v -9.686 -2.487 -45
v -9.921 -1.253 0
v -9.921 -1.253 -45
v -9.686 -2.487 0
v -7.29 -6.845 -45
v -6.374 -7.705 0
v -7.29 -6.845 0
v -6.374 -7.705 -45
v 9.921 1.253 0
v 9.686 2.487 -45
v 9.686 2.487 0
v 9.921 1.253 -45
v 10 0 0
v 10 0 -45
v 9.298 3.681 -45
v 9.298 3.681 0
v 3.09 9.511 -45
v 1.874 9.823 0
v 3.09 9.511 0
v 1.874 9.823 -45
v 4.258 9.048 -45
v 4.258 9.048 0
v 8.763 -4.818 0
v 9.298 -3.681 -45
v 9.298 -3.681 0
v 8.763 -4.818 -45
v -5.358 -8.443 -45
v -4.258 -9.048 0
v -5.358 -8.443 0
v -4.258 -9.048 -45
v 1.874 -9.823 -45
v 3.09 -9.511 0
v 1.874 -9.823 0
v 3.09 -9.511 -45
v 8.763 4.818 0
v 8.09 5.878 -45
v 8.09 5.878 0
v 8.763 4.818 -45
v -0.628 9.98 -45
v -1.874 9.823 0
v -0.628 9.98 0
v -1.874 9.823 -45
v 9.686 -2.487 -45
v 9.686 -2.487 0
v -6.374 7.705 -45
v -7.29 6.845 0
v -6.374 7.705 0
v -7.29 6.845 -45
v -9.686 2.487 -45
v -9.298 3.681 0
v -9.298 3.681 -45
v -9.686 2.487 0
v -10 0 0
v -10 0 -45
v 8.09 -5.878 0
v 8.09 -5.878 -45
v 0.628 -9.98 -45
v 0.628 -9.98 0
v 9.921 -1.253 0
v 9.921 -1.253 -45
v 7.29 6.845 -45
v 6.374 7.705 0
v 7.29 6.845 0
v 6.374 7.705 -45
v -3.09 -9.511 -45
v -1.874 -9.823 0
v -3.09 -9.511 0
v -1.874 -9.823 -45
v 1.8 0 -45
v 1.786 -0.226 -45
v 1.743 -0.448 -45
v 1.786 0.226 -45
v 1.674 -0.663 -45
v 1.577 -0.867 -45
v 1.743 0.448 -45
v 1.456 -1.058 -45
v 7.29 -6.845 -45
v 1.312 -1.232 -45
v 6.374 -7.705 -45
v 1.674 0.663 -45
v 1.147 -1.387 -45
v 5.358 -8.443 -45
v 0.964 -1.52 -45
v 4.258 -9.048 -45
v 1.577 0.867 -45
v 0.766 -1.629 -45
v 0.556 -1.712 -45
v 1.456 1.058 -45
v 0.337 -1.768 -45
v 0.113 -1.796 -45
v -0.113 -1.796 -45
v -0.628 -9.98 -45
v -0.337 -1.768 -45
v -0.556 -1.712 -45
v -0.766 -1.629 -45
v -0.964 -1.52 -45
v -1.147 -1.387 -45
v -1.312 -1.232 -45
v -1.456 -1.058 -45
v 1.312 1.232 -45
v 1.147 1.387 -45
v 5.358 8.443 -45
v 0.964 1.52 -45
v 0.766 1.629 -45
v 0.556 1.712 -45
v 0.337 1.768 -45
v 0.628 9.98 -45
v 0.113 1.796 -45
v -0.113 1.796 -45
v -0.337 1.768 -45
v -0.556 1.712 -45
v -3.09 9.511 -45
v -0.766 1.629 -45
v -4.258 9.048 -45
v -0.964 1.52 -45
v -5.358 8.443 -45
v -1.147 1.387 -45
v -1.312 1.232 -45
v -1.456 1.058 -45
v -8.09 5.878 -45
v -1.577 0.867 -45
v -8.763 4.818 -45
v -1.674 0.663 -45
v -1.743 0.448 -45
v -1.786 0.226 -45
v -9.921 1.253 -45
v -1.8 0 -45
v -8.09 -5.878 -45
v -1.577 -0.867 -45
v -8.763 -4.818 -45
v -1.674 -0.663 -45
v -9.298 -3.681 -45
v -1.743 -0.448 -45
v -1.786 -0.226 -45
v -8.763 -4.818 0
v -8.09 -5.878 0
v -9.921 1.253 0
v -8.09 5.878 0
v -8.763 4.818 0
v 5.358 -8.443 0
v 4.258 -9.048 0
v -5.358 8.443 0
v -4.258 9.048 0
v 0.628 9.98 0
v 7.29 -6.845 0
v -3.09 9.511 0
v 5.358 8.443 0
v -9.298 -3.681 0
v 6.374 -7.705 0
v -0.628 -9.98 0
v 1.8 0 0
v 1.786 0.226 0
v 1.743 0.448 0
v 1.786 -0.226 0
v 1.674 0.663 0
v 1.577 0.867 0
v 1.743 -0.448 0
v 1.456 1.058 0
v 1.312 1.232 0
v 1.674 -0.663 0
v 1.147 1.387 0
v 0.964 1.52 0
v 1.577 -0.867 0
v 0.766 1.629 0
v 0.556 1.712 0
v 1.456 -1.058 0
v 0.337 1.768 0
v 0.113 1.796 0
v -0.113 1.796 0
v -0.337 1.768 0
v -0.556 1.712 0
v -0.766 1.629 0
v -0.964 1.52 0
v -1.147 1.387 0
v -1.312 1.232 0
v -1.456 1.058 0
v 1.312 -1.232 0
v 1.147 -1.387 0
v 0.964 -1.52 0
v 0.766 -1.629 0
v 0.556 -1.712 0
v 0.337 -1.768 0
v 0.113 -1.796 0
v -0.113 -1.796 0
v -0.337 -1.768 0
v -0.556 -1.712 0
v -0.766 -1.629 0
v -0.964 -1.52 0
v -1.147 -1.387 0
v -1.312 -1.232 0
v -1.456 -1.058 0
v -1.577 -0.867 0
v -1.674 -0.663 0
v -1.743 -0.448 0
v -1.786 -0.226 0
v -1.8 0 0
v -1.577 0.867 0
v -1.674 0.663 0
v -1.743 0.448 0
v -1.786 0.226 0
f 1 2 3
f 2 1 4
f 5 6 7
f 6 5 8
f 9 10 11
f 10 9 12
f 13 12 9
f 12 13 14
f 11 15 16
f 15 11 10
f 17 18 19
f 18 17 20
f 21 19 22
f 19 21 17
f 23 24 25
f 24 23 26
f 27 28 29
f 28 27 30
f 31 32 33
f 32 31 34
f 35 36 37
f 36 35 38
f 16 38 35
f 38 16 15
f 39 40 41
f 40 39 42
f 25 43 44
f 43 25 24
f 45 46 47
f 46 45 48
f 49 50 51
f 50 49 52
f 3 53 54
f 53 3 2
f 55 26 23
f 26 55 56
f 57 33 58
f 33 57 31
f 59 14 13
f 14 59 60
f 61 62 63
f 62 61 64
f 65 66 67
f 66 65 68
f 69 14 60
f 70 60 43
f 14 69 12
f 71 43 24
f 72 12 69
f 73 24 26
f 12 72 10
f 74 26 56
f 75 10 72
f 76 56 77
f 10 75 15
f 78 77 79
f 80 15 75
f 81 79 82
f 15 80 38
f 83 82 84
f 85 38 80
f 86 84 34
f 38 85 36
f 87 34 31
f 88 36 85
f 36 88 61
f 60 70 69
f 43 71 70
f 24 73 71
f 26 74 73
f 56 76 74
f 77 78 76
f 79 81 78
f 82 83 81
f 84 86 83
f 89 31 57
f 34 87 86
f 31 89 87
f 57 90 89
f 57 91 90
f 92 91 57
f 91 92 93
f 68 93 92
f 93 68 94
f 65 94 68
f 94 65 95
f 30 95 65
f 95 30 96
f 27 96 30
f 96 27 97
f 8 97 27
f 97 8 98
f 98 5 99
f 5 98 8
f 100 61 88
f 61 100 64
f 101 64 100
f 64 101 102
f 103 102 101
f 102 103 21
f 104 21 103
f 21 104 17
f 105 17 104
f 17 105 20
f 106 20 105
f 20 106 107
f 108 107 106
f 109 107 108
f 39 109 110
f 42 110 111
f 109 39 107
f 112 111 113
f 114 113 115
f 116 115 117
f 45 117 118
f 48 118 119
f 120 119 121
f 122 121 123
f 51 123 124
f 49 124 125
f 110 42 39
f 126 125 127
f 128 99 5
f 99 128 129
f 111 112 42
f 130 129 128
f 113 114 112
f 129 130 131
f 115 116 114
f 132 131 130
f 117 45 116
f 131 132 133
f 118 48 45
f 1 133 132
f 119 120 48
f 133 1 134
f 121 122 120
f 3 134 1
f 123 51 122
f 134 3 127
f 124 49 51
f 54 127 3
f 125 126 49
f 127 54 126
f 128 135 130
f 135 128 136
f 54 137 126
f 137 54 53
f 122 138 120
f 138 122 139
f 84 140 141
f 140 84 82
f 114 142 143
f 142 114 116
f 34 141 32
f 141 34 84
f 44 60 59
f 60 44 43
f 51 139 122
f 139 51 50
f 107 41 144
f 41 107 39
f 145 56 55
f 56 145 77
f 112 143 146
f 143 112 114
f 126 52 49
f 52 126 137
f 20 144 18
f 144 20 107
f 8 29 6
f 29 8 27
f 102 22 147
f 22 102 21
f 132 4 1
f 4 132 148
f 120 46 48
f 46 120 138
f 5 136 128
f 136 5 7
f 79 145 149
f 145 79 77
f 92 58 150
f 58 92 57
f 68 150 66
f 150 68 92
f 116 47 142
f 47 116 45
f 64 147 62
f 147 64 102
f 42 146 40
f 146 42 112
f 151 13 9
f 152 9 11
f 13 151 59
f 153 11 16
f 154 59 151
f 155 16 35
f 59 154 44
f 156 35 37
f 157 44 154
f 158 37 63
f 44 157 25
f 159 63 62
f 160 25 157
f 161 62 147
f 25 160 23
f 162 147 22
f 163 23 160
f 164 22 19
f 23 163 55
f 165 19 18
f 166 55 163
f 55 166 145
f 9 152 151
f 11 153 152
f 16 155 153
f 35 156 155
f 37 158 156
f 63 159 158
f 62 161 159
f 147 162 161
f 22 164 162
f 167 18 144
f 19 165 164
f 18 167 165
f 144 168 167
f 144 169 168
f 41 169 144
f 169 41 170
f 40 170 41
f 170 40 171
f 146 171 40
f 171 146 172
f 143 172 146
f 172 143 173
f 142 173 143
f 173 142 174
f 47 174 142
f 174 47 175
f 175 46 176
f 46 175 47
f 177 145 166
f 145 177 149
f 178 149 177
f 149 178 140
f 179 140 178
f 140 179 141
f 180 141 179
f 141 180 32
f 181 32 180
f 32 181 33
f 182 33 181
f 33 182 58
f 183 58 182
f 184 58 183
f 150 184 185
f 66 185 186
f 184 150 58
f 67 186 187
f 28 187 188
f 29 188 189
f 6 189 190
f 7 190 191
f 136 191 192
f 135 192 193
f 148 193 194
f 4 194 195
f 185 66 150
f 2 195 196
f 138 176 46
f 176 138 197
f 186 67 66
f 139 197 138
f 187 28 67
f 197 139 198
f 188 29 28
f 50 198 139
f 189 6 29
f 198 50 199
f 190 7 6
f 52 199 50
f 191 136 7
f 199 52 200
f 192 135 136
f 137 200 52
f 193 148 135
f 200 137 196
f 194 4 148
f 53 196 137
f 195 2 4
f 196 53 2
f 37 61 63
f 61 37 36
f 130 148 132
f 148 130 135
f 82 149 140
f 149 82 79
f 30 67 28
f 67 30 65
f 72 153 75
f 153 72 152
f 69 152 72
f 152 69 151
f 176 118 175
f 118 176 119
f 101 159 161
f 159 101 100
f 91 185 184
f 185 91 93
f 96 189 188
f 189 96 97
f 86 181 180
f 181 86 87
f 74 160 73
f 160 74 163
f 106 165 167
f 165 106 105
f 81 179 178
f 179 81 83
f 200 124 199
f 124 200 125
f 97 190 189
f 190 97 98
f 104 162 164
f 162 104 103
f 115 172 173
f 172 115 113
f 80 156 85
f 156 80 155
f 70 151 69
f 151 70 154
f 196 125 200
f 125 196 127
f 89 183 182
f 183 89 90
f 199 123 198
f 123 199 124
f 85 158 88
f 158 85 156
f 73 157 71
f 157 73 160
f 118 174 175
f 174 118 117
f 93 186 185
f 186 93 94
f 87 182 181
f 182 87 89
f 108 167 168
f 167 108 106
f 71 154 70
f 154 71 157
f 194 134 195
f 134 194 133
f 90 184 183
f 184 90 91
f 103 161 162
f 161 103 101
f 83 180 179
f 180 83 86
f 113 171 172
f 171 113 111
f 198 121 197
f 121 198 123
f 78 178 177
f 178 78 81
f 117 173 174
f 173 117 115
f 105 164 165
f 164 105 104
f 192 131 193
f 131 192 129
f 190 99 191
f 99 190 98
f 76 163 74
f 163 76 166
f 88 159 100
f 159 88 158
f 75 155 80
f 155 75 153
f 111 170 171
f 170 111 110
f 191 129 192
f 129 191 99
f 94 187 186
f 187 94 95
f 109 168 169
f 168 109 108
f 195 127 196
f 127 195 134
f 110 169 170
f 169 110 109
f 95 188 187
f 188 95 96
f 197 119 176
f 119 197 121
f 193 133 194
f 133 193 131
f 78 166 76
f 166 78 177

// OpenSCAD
$fn = 50;


difference() {
	union() {
		translate(v = [0, 0, -45.0000000000]) {
			cylinder(h = 45, r = 10.0000000000);
		}
		cylinder(h = 0, r = 19.0000000000);
	}
	union() {
		#translate(v = [0, 0, -45]) {
			cylinder(h = 45, r = 1.8000000000);
		}
	}
}
